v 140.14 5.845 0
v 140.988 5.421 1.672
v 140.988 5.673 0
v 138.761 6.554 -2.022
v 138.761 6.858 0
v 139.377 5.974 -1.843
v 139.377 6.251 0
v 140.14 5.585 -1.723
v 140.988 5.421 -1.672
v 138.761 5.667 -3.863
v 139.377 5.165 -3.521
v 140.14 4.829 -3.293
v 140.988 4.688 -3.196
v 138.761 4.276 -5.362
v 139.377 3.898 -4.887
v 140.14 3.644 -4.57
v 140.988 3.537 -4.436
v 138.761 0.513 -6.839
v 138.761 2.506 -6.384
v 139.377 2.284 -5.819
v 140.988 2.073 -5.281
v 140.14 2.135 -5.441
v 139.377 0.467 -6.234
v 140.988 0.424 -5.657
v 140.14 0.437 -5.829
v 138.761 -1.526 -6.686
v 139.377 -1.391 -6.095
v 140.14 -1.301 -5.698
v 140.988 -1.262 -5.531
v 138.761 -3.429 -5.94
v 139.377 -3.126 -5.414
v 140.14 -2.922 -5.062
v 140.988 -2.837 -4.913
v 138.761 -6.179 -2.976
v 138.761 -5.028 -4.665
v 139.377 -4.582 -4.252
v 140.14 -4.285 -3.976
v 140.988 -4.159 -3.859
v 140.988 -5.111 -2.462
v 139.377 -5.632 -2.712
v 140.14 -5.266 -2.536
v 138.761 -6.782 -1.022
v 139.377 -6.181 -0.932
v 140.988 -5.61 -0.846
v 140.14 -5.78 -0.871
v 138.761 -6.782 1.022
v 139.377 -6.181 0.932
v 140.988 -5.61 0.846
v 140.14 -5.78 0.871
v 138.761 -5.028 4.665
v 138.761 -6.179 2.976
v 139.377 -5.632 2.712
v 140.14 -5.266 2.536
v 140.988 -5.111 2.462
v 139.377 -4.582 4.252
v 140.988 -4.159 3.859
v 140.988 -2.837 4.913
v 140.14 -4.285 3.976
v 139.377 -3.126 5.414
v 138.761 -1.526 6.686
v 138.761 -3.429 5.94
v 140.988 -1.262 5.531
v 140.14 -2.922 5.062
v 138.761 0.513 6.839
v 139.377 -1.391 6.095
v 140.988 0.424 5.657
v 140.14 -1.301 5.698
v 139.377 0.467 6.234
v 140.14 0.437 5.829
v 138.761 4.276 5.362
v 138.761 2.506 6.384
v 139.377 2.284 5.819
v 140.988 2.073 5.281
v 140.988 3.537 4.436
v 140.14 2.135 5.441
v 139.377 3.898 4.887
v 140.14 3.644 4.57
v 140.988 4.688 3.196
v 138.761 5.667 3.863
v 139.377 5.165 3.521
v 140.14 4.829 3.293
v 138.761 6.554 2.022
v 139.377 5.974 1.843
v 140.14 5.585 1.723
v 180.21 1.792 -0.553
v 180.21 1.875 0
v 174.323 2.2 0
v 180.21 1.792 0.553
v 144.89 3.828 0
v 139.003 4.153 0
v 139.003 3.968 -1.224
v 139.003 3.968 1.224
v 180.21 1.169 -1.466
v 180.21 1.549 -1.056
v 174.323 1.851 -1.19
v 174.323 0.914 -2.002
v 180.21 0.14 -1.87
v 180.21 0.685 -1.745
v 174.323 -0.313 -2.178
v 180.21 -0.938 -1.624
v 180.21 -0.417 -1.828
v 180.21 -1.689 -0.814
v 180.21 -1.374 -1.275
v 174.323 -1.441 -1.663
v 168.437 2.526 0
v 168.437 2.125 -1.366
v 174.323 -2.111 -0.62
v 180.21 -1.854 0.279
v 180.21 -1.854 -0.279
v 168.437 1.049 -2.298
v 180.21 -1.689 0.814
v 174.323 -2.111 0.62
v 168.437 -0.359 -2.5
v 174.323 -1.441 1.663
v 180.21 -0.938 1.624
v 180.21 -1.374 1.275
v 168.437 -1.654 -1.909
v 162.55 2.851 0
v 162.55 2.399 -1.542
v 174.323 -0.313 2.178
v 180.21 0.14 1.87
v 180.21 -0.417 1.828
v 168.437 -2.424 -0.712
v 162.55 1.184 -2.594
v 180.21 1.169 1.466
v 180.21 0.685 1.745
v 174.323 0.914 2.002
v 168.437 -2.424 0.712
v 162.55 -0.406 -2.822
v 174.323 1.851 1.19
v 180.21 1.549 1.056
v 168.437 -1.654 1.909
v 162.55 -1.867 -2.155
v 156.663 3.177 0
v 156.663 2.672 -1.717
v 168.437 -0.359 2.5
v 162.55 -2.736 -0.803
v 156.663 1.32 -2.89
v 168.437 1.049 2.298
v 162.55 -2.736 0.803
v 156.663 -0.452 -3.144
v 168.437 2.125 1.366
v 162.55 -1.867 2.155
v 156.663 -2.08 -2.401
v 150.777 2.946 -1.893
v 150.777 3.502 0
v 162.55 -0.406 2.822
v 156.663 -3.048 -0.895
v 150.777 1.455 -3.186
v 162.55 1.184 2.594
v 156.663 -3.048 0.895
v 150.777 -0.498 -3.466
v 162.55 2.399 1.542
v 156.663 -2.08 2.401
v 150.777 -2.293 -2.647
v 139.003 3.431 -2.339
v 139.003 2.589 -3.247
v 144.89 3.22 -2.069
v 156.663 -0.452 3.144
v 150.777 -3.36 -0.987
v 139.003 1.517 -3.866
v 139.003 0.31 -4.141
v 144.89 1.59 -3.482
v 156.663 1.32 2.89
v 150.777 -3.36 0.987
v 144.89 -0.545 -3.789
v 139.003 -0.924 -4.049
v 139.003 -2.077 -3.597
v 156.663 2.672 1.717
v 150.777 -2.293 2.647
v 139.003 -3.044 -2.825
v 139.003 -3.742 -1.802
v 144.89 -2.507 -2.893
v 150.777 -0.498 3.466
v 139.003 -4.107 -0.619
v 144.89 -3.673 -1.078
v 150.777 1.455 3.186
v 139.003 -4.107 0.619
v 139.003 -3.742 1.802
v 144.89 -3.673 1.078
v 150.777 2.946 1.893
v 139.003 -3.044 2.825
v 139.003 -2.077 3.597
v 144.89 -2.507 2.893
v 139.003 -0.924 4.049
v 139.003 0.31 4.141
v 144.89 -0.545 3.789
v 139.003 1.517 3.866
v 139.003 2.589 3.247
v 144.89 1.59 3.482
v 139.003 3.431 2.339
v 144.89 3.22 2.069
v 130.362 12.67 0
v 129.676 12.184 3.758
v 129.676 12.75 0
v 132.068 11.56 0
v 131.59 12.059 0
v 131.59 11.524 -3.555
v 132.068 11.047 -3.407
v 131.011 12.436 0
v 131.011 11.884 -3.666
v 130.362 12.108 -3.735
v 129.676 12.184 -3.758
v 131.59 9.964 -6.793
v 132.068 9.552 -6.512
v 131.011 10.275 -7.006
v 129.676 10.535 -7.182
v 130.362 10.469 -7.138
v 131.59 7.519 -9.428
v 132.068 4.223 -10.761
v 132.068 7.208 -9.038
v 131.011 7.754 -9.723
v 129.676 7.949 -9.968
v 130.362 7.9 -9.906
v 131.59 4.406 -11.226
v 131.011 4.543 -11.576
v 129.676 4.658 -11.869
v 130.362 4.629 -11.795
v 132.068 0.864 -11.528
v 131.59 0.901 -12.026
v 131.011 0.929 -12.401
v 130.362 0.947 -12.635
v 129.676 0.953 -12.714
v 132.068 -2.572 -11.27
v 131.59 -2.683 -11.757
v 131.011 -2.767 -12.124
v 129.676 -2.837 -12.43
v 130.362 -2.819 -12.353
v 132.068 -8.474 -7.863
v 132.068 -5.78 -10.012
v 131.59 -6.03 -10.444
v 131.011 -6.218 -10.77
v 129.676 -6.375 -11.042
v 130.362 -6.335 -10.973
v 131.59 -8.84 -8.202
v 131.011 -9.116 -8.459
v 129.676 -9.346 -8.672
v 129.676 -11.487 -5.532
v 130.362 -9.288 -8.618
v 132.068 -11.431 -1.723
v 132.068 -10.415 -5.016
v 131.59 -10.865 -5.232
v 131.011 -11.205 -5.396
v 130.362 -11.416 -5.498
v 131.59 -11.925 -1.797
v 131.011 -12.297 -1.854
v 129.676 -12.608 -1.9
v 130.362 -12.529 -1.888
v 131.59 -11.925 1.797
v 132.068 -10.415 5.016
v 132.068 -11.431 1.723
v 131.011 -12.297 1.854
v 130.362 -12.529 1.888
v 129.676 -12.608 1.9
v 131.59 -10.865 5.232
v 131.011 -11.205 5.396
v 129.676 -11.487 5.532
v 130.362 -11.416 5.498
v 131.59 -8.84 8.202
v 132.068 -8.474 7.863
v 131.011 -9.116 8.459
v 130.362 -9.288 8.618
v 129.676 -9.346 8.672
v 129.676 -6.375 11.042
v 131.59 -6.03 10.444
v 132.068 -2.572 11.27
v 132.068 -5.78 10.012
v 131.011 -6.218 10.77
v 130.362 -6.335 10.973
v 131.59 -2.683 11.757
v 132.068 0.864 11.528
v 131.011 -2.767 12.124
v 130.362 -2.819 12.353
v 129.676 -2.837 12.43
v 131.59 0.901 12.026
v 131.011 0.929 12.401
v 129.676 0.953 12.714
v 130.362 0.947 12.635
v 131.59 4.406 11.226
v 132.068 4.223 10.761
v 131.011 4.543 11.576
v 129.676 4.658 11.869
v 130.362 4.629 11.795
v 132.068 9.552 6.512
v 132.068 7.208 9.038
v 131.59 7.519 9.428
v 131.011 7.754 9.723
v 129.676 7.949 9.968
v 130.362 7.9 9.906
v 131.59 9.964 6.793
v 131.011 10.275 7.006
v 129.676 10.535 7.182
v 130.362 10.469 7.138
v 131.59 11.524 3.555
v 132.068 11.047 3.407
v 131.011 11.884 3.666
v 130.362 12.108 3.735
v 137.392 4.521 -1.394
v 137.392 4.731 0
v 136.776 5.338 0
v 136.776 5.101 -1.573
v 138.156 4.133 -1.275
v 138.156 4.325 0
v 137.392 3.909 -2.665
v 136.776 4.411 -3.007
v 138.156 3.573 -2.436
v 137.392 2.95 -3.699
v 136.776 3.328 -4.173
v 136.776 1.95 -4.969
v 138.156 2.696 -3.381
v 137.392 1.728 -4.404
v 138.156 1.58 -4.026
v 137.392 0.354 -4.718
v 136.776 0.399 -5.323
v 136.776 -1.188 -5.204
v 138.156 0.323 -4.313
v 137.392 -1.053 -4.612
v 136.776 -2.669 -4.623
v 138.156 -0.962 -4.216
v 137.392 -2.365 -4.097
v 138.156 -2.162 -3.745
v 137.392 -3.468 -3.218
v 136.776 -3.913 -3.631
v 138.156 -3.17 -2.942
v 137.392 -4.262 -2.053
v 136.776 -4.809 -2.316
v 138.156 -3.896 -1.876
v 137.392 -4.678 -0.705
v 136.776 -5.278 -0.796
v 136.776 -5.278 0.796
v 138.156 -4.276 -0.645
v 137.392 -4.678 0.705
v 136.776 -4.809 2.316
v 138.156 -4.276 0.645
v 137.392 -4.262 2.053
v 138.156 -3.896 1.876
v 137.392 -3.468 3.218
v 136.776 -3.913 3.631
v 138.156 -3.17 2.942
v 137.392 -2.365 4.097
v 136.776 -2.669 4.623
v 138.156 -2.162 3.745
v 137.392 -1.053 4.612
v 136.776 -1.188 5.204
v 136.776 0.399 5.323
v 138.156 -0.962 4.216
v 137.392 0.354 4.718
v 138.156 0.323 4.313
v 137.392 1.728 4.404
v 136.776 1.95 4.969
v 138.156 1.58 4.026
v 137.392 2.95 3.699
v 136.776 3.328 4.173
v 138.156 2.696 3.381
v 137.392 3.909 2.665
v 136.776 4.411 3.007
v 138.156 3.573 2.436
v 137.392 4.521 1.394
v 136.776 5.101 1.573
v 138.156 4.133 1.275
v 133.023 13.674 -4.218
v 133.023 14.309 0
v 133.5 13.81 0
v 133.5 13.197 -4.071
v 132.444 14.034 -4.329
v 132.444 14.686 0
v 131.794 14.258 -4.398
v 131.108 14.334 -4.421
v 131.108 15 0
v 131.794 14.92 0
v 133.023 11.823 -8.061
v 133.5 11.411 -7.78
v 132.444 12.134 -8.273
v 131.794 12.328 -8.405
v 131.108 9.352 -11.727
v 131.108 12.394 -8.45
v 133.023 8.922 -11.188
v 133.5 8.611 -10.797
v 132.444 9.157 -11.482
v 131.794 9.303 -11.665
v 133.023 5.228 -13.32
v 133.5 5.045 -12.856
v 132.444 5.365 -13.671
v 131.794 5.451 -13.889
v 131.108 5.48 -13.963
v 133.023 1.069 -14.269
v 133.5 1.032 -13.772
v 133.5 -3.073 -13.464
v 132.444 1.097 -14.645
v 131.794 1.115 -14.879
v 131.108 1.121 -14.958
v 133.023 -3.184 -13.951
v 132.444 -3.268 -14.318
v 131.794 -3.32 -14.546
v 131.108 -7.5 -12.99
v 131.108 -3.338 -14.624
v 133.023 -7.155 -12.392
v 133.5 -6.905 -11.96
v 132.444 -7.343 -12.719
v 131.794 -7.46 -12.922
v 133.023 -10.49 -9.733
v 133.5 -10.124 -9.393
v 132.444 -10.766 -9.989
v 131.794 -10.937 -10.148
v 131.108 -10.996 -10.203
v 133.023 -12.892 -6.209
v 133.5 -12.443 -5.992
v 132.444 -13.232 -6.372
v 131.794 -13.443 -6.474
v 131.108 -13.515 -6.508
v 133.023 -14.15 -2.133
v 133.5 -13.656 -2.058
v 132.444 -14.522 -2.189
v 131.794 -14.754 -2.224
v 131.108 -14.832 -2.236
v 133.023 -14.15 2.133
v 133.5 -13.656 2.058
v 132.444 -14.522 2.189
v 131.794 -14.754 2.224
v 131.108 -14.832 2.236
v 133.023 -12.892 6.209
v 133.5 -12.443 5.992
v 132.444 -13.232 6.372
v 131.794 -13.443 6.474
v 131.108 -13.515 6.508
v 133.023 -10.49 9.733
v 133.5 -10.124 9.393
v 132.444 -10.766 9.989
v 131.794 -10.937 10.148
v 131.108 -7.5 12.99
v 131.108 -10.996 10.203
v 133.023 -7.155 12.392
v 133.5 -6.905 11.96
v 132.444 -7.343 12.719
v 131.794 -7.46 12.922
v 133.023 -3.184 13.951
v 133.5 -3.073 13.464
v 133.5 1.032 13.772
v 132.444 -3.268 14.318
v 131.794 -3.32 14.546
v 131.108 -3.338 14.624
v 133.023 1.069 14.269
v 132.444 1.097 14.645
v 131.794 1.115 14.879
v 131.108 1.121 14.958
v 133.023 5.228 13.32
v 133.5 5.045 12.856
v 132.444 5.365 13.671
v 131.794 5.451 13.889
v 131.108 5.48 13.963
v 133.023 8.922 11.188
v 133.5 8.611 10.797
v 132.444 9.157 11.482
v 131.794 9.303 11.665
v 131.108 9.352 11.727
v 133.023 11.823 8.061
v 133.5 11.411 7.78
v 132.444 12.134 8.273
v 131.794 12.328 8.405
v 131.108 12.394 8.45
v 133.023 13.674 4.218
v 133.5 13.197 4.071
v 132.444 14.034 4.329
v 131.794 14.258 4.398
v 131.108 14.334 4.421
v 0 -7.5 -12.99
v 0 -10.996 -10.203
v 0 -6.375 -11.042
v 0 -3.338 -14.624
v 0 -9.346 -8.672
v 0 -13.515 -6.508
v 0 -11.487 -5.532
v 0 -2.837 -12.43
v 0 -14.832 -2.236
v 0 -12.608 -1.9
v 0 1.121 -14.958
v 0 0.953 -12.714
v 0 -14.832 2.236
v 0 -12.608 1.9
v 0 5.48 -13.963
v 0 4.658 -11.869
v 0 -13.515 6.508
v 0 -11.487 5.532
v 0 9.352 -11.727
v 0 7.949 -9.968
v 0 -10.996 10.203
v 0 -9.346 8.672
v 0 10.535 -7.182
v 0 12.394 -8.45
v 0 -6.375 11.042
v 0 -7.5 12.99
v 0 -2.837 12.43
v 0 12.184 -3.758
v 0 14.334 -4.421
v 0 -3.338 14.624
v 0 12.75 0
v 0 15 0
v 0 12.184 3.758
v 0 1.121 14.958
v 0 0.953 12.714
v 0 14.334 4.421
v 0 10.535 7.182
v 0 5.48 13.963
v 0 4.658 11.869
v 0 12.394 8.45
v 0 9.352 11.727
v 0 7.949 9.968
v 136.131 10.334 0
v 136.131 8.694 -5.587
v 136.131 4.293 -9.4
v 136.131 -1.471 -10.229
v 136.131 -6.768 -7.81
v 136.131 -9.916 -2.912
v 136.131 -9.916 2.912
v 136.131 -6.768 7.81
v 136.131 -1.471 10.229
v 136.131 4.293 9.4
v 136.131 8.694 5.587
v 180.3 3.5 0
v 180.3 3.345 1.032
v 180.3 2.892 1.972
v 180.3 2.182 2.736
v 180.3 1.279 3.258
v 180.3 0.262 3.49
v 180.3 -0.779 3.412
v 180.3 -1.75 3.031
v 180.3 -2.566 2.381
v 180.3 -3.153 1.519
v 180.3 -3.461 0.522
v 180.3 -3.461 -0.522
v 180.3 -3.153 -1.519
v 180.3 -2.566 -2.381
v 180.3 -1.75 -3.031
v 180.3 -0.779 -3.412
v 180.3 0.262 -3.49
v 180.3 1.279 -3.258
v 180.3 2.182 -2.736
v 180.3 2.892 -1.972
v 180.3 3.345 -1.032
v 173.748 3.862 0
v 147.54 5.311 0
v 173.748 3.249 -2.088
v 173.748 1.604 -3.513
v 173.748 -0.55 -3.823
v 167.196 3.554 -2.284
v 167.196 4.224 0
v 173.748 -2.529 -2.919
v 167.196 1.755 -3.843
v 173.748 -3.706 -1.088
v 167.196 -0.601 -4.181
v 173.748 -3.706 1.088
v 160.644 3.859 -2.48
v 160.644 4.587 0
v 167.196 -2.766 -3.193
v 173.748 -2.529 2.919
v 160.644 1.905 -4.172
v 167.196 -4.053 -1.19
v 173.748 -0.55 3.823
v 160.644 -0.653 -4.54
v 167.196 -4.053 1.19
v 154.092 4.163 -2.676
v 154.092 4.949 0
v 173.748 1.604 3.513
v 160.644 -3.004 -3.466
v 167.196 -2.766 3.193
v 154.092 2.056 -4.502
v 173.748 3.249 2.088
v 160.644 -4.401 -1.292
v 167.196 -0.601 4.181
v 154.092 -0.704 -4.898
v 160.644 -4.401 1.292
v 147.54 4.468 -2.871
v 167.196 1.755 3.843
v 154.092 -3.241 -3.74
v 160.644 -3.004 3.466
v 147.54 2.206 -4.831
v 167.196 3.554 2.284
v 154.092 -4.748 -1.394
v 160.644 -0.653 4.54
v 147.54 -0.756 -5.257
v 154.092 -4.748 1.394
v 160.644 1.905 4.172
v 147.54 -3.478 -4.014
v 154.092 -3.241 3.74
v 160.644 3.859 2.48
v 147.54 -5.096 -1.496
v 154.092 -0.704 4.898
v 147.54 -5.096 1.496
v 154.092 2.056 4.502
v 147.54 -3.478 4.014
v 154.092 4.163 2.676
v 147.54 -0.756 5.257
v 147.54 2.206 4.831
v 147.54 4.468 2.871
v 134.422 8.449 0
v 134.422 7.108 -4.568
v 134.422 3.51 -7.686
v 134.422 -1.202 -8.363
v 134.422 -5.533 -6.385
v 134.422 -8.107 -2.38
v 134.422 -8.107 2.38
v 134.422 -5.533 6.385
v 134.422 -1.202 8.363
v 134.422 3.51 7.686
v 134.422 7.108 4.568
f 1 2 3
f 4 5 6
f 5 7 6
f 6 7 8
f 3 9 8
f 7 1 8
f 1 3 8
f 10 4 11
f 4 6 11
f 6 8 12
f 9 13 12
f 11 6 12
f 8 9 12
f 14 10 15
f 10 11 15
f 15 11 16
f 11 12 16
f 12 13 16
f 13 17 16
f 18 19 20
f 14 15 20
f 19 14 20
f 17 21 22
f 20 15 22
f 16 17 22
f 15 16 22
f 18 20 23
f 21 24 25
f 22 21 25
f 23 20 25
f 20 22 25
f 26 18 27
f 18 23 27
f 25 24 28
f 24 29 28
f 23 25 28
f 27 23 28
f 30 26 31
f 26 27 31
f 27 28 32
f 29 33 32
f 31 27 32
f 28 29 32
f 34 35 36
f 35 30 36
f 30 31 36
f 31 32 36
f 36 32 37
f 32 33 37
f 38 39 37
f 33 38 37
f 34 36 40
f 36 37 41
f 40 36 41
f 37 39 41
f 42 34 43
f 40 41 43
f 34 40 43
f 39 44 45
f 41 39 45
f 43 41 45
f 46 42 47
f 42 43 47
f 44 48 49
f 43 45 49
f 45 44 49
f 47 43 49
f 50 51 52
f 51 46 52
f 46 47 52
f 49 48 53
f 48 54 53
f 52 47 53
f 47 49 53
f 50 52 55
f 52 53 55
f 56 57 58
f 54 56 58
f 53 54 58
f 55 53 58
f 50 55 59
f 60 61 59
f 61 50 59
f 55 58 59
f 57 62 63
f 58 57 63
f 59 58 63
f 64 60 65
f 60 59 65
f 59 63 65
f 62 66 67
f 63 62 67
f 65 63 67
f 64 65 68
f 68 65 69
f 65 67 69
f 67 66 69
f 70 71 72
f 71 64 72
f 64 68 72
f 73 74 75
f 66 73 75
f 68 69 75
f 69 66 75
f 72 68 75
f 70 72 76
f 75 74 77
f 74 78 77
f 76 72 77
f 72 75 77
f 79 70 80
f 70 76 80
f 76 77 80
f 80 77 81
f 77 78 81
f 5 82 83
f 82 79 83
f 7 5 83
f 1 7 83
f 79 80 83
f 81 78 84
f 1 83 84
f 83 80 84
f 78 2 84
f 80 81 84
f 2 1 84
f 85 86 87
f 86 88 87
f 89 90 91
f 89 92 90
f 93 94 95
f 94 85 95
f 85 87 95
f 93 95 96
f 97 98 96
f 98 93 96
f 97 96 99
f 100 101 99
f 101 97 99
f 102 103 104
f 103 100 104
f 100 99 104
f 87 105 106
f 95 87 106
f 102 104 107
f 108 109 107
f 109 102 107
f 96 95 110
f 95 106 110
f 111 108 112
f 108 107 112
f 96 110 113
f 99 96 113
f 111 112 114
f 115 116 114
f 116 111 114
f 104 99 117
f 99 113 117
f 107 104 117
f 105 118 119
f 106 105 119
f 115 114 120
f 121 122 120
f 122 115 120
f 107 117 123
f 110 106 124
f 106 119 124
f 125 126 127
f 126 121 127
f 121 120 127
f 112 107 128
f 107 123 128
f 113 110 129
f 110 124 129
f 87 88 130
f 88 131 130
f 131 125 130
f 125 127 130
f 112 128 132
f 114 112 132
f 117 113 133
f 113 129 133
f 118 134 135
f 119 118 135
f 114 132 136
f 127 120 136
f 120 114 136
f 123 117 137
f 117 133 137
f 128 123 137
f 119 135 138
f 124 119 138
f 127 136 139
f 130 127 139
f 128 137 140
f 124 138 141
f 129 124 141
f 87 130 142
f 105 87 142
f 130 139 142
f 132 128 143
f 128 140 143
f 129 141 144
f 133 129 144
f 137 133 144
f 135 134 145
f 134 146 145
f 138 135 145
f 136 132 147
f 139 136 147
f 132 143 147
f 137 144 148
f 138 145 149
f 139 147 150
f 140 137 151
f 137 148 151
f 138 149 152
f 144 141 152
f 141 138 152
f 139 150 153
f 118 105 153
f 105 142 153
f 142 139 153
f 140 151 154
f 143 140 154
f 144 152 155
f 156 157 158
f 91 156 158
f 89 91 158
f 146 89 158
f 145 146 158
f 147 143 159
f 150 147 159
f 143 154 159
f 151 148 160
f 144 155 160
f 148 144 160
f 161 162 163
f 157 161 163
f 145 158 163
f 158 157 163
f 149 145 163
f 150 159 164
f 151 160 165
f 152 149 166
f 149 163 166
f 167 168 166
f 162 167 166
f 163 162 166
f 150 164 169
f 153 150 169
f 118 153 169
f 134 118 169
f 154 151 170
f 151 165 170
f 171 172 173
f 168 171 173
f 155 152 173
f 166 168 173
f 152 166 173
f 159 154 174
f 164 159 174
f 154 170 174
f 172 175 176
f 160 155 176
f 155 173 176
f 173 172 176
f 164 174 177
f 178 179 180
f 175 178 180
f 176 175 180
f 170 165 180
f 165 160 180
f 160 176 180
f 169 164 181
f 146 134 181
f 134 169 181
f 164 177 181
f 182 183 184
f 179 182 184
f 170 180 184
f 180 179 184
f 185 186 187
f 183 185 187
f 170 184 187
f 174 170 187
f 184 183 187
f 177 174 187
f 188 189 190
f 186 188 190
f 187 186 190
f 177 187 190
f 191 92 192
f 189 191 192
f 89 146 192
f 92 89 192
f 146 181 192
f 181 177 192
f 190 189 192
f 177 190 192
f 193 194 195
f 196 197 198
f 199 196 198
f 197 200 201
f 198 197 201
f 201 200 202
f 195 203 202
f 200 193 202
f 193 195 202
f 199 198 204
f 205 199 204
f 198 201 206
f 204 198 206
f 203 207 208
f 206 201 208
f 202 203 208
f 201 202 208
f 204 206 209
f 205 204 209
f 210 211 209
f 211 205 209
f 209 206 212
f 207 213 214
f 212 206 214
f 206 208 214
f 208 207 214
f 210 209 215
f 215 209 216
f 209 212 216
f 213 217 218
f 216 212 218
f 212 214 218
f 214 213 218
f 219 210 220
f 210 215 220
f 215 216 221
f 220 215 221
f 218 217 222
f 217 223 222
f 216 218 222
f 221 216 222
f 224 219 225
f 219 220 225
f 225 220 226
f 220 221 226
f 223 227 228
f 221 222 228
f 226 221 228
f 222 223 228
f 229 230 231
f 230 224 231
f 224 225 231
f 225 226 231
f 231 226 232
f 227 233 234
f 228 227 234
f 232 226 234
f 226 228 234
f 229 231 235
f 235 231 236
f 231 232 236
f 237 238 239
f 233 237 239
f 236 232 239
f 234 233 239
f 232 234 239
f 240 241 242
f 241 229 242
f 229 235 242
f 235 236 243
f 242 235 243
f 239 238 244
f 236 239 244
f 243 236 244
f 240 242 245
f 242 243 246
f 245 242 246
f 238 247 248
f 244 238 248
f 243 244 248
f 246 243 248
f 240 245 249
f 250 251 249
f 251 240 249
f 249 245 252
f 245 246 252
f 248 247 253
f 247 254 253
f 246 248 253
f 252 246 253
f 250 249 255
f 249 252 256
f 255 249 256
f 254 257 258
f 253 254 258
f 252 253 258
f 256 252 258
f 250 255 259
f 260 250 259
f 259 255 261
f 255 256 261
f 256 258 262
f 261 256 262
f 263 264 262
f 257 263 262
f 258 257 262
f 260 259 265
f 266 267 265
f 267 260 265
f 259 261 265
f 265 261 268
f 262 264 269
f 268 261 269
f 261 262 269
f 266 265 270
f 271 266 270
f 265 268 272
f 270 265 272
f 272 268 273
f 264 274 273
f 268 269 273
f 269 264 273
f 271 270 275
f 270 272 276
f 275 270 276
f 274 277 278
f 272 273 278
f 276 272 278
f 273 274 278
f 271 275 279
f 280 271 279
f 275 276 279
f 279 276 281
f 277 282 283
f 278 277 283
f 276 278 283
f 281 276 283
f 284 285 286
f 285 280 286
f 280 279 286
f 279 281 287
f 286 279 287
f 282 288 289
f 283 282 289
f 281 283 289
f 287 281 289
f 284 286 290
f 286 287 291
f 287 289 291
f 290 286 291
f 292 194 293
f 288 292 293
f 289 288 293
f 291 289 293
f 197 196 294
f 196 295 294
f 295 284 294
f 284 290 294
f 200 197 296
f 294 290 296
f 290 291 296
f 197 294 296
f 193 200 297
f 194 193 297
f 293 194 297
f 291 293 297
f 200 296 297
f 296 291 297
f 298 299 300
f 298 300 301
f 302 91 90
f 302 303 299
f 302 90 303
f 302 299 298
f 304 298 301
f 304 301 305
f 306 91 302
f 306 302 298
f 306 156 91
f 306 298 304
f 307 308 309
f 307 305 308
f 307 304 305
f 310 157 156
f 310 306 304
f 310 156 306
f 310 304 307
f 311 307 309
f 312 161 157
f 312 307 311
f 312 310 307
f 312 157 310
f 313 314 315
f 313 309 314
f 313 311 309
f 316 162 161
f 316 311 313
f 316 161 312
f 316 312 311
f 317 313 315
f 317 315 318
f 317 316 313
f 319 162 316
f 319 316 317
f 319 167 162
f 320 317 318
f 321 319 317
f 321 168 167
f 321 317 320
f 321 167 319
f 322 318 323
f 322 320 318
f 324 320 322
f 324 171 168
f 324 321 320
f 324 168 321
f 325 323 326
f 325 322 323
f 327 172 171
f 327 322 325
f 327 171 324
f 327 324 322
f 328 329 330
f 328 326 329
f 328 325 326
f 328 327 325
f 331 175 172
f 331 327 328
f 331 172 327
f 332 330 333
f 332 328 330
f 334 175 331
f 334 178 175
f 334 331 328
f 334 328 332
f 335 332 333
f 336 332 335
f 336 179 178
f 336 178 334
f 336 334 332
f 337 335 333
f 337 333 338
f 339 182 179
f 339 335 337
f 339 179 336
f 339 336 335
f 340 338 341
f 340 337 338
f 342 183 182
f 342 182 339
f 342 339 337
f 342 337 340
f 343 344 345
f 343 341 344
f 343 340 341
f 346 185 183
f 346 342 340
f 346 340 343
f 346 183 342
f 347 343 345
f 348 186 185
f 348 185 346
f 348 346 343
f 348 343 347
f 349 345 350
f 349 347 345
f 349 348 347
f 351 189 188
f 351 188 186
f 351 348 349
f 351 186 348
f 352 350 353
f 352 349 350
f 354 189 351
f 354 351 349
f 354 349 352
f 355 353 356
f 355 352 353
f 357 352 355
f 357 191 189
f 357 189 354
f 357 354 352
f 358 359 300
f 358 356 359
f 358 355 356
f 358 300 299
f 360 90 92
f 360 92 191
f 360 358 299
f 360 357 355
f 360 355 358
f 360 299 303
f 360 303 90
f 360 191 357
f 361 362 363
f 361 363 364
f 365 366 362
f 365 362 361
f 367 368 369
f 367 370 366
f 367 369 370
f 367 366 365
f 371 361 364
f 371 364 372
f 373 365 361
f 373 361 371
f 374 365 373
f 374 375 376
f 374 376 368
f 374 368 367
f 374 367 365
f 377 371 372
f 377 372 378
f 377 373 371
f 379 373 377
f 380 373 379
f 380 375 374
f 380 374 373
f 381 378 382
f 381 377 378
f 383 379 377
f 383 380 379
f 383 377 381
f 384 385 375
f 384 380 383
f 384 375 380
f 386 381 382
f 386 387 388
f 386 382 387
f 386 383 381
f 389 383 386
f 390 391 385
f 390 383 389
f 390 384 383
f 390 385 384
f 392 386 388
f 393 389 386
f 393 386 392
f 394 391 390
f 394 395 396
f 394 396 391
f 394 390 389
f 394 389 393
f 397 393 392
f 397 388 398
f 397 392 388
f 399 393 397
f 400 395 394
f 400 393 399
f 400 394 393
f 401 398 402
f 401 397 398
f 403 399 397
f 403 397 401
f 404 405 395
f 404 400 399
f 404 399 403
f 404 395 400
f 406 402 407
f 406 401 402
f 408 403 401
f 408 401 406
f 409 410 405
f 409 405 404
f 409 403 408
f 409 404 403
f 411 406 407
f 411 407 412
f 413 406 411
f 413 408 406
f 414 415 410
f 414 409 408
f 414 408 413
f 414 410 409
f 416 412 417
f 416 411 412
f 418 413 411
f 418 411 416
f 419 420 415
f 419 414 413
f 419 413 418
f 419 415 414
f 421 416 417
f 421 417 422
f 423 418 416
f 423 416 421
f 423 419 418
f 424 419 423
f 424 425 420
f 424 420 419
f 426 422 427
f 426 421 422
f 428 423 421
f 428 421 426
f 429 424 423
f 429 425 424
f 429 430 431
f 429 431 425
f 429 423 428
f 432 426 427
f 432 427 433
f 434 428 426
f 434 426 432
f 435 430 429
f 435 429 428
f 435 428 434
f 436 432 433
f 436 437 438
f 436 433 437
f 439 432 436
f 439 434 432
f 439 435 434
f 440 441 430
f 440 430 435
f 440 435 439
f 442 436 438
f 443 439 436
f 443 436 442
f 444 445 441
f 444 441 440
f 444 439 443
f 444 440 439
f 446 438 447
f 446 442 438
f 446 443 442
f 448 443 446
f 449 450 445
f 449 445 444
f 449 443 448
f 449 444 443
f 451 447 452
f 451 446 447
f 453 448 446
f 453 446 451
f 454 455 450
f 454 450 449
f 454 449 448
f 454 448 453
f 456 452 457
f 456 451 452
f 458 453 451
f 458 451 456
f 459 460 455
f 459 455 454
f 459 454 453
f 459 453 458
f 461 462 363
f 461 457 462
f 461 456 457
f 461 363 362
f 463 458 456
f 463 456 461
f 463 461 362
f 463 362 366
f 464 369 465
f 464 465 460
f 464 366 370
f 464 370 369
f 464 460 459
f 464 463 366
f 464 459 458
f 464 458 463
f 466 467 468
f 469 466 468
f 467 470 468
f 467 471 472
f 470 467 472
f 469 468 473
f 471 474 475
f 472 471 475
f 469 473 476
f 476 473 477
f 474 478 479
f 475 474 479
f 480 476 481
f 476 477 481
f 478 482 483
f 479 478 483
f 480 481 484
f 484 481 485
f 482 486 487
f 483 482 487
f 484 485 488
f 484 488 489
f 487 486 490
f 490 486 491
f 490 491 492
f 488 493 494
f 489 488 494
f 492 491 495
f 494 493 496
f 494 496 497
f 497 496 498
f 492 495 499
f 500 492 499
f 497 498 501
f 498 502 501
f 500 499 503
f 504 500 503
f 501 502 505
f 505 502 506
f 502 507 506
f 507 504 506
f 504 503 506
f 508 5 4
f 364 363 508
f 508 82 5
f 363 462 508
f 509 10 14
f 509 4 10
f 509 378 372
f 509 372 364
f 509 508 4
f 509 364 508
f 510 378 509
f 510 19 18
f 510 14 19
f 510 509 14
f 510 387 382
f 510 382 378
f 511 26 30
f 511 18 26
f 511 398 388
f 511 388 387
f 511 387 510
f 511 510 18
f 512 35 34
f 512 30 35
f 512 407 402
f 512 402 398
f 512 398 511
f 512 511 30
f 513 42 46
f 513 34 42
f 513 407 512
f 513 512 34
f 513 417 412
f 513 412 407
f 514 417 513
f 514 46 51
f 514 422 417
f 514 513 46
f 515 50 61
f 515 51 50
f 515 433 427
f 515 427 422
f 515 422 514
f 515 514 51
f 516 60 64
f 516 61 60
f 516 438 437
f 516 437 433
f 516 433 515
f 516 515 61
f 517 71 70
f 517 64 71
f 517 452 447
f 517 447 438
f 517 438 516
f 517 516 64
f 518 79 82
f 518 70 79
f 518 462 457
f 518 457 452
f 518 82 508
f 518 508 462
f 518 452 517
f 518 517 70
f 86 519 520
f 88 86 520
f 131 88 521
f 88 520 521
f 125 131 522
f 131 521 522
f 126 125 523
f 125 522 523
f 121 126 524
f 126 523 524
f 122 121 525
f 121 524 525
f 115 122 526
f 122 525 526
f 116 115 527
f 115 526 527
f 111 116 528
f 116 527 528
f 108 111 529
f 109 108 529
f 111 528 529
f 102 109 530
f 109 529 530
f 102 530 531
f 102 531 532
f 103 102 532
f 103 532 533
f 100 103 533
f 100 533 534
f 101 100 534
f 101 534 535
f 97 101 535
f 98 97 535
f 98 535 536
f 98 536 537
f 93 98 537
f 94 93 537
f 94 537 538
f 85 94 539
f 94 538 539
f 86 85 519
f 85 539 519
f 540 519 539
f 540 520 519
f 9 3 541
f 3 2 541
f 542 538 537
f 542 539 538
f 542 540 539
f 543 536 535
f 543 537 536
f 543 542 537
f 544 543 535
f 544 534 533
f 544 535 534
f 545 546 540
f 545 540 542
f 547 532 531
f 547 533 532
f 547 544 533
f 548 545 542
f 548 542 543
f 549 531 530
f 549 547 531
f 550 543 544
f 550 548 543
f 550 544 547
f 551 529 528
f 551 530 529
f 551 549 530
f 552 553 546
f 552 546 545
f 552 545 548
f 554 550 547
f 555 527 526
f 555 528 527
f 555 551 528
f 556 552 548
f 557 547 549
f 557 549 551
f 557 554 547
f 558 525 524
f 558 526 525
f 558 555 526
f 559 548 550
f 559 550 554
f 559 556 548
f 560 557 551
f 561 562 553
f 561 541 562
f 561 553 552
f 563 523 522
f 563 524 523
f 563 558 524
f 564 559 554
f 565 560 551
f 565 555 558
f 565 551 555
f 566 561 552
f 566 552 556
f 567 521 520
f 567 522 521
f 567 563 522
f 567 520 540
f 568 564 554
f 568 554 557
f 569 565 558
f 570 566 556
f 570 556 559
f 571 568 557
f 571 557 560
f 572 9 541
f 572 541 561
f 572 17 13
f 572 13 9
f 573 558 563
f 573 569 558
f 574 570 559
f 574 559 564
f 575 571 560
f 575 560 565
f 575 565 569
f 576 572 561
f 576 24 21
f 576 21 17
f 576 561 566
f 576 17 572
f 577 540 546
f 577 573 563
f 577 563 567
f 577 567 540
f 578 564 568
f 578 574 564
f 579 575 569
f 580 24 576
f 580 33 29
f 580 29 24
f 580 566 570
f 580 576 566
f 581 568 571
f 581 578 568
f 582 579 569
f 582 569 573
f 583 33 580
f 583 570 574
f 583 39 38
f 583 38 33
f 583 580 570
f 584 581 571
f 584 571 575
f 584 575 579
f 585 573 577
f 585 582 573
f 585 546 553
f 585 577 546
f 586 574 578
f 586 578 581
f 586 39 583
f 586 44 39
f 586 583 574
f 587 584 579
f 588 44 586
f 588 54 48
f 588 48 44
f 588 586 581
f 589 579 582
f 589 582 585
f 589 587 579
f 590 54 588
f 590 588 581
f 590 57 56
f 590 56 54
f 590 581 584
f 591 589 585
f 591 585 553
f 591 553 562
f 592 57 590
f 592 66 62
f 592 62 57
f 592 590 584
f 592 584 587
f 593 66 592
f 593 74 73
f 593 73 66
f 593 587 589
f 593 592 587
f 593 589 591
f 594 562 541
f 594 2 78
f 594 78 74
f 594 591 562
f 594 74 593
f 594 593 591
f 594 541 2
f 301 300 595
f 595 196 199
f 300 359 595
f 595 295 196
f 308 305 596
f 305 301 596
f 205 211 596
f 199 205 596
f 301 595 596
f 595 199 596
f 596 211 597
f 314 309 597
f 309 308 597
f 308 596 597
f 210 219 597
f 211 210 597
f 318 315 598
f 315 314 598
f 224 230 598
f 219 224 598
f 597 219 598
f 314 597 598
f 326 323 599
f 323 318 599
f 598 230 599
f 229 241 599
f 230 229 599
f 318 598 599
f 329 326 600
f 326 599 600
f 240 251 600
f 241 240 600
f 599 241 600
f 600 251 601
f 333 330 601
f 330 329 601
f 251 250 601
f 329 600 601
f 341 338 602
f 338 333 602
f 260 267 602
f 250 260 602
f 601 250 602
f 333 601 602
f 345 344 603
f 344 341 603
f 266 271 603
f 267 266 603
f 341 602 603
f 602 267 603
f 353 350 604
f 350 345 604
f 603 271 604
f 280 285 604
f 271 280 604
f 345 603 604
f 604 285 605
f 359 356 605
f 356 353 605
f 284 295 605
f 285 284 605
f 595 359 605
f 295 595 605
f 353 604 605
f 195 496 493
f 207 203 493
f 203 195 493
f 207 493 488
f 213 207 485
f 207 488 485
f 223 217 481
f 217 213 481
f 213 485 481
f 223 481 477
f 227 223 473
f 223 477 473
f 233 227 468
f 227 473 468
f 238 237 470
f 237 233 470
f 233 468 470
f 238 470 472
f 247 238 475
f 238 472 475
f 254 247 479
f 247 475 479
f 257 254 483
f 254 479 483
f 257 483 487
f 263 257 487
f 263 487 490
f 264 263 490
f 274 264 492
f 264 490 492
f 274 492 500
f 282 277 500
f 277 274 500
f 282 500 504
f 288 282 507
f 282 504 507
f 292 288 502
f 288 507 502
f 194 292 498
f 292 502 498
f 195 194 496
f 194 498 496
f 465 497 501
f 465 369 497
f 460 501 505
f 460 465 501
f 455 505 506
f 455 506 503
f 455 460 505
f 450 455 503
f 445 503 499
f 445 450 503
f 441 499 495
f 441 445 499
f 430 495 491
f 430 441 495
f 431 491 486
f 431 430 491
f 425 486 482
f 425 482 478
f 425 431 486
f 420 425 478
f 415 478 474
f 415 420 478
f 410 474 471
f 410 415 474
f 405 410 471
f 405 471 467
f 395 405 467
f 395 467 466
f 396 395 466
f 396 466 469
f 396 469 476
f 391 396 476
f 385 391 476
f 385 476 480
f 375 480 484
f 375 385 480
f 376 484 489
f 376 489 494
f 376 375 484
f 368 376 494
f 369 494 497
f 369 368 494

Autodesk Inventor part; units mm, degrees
ref_plane "YZ Plane" through (0, 0, 0) normal (1, 0, 0) x (0, 1, 0)
ref_plane "XZ Plane" through (0, 0, 0) normal (0, 1, 0) x (-1, 0, 0)
ref_plane "XY Plane" through (0, 0, 0) normal (0, 0, 1) x (1, 0, 0)
sketch "Skizze2" plane through (0, 0, 0) normal (0, 0, 1) x (1, 0, 0)
  line L0 (0, 0) -> (52.5603, 0) construction
  line L1 (0, 12.75) -> (0, 15)
  line L2 (0, 15) -> (131.1081, 15)
  line L3 (129.6756, 12.75) -> (0, 12.75)
  line L4 (0, 12.75) -> (0, 0) construction
  line L5 (180.3, 3.5) -> (140.9879, 5.6733)
  line L6 (138.7612, 6.8584) -> (133.5003, 13.8103)
  line L7 (180.3, 3.5) -> (180.2102, 1.875)
  line L8 (180.2102, 1.875) -> (139.0031, 4.153)
  line L9 (136.7765, 5.3381) -> (132.0678, 11.5603)
  arc A0 (133.5003, 13.8103) -> (131.1081, 15) centre (131.1081, 12) ccw
  arc A1 (138.7612, 6.8584) -> (140.9879, 5.6733) centre (141.1534, 8.6687) ccw
  arc A2 (132.0678, 11.5603) -> (129.6756, 12.75) centre (129.6756, 9.75) ccw
  arc A3 (136.7765, 5.3381) -> (139.0031, 4.153) centre (139.1687, 7.1485) ccw
  point P0 (132.6, 15)
  point P1 (131.1675, 12.75)
  point P2 (139.6, 5.75)
  point P3 (137.6153, 4.2298)
  dimension "d2" = 30
  dimension "d4" = 25.5
  dimension "d5" = 7
  dimension "d6" = 3.75
  dimension "d7" = 40.7
  dimension "d8" = 11.5
  dimension "d9" = 7
  dimension "d10" = 2.5
  dimension "d11" = 180.3
  dimension "d12" = 3
revolve "Umdrehung1" add sketch "Skizze2" angle 360 about axis through (0, 0, 0) along (1, 0, 0)
sketch "Skizze3" plane through (0, 0, 0) normal (-1, 0, 0) x (0, 0, 1)
  circle A0 centre (0, 0) radius 1.875 projected
  arc A1 (0, 12.75) -> (-12.75, 0) centre (0, 0) ccw
  arc A2 (0, 16) -> (-5.7621, 14.9264) centre (0, 0) ccw
  line L0 (0, 0) -> (-25, 0)
  line L1 (-25, 0) -> (-25, 7.5)
  line L2 (-25, 7.5) -> (-5.7621, 14.9264)
  line L3 (0, 0) -> (0, 16)
  circle A3 centre (0, 0) radius 12.75 projected
  dimension "d13" = 25
  dimension "d14" = 16
  dimension "d15" = 7.5
properties part number "P_Spritze_60ml" material "Glas"
